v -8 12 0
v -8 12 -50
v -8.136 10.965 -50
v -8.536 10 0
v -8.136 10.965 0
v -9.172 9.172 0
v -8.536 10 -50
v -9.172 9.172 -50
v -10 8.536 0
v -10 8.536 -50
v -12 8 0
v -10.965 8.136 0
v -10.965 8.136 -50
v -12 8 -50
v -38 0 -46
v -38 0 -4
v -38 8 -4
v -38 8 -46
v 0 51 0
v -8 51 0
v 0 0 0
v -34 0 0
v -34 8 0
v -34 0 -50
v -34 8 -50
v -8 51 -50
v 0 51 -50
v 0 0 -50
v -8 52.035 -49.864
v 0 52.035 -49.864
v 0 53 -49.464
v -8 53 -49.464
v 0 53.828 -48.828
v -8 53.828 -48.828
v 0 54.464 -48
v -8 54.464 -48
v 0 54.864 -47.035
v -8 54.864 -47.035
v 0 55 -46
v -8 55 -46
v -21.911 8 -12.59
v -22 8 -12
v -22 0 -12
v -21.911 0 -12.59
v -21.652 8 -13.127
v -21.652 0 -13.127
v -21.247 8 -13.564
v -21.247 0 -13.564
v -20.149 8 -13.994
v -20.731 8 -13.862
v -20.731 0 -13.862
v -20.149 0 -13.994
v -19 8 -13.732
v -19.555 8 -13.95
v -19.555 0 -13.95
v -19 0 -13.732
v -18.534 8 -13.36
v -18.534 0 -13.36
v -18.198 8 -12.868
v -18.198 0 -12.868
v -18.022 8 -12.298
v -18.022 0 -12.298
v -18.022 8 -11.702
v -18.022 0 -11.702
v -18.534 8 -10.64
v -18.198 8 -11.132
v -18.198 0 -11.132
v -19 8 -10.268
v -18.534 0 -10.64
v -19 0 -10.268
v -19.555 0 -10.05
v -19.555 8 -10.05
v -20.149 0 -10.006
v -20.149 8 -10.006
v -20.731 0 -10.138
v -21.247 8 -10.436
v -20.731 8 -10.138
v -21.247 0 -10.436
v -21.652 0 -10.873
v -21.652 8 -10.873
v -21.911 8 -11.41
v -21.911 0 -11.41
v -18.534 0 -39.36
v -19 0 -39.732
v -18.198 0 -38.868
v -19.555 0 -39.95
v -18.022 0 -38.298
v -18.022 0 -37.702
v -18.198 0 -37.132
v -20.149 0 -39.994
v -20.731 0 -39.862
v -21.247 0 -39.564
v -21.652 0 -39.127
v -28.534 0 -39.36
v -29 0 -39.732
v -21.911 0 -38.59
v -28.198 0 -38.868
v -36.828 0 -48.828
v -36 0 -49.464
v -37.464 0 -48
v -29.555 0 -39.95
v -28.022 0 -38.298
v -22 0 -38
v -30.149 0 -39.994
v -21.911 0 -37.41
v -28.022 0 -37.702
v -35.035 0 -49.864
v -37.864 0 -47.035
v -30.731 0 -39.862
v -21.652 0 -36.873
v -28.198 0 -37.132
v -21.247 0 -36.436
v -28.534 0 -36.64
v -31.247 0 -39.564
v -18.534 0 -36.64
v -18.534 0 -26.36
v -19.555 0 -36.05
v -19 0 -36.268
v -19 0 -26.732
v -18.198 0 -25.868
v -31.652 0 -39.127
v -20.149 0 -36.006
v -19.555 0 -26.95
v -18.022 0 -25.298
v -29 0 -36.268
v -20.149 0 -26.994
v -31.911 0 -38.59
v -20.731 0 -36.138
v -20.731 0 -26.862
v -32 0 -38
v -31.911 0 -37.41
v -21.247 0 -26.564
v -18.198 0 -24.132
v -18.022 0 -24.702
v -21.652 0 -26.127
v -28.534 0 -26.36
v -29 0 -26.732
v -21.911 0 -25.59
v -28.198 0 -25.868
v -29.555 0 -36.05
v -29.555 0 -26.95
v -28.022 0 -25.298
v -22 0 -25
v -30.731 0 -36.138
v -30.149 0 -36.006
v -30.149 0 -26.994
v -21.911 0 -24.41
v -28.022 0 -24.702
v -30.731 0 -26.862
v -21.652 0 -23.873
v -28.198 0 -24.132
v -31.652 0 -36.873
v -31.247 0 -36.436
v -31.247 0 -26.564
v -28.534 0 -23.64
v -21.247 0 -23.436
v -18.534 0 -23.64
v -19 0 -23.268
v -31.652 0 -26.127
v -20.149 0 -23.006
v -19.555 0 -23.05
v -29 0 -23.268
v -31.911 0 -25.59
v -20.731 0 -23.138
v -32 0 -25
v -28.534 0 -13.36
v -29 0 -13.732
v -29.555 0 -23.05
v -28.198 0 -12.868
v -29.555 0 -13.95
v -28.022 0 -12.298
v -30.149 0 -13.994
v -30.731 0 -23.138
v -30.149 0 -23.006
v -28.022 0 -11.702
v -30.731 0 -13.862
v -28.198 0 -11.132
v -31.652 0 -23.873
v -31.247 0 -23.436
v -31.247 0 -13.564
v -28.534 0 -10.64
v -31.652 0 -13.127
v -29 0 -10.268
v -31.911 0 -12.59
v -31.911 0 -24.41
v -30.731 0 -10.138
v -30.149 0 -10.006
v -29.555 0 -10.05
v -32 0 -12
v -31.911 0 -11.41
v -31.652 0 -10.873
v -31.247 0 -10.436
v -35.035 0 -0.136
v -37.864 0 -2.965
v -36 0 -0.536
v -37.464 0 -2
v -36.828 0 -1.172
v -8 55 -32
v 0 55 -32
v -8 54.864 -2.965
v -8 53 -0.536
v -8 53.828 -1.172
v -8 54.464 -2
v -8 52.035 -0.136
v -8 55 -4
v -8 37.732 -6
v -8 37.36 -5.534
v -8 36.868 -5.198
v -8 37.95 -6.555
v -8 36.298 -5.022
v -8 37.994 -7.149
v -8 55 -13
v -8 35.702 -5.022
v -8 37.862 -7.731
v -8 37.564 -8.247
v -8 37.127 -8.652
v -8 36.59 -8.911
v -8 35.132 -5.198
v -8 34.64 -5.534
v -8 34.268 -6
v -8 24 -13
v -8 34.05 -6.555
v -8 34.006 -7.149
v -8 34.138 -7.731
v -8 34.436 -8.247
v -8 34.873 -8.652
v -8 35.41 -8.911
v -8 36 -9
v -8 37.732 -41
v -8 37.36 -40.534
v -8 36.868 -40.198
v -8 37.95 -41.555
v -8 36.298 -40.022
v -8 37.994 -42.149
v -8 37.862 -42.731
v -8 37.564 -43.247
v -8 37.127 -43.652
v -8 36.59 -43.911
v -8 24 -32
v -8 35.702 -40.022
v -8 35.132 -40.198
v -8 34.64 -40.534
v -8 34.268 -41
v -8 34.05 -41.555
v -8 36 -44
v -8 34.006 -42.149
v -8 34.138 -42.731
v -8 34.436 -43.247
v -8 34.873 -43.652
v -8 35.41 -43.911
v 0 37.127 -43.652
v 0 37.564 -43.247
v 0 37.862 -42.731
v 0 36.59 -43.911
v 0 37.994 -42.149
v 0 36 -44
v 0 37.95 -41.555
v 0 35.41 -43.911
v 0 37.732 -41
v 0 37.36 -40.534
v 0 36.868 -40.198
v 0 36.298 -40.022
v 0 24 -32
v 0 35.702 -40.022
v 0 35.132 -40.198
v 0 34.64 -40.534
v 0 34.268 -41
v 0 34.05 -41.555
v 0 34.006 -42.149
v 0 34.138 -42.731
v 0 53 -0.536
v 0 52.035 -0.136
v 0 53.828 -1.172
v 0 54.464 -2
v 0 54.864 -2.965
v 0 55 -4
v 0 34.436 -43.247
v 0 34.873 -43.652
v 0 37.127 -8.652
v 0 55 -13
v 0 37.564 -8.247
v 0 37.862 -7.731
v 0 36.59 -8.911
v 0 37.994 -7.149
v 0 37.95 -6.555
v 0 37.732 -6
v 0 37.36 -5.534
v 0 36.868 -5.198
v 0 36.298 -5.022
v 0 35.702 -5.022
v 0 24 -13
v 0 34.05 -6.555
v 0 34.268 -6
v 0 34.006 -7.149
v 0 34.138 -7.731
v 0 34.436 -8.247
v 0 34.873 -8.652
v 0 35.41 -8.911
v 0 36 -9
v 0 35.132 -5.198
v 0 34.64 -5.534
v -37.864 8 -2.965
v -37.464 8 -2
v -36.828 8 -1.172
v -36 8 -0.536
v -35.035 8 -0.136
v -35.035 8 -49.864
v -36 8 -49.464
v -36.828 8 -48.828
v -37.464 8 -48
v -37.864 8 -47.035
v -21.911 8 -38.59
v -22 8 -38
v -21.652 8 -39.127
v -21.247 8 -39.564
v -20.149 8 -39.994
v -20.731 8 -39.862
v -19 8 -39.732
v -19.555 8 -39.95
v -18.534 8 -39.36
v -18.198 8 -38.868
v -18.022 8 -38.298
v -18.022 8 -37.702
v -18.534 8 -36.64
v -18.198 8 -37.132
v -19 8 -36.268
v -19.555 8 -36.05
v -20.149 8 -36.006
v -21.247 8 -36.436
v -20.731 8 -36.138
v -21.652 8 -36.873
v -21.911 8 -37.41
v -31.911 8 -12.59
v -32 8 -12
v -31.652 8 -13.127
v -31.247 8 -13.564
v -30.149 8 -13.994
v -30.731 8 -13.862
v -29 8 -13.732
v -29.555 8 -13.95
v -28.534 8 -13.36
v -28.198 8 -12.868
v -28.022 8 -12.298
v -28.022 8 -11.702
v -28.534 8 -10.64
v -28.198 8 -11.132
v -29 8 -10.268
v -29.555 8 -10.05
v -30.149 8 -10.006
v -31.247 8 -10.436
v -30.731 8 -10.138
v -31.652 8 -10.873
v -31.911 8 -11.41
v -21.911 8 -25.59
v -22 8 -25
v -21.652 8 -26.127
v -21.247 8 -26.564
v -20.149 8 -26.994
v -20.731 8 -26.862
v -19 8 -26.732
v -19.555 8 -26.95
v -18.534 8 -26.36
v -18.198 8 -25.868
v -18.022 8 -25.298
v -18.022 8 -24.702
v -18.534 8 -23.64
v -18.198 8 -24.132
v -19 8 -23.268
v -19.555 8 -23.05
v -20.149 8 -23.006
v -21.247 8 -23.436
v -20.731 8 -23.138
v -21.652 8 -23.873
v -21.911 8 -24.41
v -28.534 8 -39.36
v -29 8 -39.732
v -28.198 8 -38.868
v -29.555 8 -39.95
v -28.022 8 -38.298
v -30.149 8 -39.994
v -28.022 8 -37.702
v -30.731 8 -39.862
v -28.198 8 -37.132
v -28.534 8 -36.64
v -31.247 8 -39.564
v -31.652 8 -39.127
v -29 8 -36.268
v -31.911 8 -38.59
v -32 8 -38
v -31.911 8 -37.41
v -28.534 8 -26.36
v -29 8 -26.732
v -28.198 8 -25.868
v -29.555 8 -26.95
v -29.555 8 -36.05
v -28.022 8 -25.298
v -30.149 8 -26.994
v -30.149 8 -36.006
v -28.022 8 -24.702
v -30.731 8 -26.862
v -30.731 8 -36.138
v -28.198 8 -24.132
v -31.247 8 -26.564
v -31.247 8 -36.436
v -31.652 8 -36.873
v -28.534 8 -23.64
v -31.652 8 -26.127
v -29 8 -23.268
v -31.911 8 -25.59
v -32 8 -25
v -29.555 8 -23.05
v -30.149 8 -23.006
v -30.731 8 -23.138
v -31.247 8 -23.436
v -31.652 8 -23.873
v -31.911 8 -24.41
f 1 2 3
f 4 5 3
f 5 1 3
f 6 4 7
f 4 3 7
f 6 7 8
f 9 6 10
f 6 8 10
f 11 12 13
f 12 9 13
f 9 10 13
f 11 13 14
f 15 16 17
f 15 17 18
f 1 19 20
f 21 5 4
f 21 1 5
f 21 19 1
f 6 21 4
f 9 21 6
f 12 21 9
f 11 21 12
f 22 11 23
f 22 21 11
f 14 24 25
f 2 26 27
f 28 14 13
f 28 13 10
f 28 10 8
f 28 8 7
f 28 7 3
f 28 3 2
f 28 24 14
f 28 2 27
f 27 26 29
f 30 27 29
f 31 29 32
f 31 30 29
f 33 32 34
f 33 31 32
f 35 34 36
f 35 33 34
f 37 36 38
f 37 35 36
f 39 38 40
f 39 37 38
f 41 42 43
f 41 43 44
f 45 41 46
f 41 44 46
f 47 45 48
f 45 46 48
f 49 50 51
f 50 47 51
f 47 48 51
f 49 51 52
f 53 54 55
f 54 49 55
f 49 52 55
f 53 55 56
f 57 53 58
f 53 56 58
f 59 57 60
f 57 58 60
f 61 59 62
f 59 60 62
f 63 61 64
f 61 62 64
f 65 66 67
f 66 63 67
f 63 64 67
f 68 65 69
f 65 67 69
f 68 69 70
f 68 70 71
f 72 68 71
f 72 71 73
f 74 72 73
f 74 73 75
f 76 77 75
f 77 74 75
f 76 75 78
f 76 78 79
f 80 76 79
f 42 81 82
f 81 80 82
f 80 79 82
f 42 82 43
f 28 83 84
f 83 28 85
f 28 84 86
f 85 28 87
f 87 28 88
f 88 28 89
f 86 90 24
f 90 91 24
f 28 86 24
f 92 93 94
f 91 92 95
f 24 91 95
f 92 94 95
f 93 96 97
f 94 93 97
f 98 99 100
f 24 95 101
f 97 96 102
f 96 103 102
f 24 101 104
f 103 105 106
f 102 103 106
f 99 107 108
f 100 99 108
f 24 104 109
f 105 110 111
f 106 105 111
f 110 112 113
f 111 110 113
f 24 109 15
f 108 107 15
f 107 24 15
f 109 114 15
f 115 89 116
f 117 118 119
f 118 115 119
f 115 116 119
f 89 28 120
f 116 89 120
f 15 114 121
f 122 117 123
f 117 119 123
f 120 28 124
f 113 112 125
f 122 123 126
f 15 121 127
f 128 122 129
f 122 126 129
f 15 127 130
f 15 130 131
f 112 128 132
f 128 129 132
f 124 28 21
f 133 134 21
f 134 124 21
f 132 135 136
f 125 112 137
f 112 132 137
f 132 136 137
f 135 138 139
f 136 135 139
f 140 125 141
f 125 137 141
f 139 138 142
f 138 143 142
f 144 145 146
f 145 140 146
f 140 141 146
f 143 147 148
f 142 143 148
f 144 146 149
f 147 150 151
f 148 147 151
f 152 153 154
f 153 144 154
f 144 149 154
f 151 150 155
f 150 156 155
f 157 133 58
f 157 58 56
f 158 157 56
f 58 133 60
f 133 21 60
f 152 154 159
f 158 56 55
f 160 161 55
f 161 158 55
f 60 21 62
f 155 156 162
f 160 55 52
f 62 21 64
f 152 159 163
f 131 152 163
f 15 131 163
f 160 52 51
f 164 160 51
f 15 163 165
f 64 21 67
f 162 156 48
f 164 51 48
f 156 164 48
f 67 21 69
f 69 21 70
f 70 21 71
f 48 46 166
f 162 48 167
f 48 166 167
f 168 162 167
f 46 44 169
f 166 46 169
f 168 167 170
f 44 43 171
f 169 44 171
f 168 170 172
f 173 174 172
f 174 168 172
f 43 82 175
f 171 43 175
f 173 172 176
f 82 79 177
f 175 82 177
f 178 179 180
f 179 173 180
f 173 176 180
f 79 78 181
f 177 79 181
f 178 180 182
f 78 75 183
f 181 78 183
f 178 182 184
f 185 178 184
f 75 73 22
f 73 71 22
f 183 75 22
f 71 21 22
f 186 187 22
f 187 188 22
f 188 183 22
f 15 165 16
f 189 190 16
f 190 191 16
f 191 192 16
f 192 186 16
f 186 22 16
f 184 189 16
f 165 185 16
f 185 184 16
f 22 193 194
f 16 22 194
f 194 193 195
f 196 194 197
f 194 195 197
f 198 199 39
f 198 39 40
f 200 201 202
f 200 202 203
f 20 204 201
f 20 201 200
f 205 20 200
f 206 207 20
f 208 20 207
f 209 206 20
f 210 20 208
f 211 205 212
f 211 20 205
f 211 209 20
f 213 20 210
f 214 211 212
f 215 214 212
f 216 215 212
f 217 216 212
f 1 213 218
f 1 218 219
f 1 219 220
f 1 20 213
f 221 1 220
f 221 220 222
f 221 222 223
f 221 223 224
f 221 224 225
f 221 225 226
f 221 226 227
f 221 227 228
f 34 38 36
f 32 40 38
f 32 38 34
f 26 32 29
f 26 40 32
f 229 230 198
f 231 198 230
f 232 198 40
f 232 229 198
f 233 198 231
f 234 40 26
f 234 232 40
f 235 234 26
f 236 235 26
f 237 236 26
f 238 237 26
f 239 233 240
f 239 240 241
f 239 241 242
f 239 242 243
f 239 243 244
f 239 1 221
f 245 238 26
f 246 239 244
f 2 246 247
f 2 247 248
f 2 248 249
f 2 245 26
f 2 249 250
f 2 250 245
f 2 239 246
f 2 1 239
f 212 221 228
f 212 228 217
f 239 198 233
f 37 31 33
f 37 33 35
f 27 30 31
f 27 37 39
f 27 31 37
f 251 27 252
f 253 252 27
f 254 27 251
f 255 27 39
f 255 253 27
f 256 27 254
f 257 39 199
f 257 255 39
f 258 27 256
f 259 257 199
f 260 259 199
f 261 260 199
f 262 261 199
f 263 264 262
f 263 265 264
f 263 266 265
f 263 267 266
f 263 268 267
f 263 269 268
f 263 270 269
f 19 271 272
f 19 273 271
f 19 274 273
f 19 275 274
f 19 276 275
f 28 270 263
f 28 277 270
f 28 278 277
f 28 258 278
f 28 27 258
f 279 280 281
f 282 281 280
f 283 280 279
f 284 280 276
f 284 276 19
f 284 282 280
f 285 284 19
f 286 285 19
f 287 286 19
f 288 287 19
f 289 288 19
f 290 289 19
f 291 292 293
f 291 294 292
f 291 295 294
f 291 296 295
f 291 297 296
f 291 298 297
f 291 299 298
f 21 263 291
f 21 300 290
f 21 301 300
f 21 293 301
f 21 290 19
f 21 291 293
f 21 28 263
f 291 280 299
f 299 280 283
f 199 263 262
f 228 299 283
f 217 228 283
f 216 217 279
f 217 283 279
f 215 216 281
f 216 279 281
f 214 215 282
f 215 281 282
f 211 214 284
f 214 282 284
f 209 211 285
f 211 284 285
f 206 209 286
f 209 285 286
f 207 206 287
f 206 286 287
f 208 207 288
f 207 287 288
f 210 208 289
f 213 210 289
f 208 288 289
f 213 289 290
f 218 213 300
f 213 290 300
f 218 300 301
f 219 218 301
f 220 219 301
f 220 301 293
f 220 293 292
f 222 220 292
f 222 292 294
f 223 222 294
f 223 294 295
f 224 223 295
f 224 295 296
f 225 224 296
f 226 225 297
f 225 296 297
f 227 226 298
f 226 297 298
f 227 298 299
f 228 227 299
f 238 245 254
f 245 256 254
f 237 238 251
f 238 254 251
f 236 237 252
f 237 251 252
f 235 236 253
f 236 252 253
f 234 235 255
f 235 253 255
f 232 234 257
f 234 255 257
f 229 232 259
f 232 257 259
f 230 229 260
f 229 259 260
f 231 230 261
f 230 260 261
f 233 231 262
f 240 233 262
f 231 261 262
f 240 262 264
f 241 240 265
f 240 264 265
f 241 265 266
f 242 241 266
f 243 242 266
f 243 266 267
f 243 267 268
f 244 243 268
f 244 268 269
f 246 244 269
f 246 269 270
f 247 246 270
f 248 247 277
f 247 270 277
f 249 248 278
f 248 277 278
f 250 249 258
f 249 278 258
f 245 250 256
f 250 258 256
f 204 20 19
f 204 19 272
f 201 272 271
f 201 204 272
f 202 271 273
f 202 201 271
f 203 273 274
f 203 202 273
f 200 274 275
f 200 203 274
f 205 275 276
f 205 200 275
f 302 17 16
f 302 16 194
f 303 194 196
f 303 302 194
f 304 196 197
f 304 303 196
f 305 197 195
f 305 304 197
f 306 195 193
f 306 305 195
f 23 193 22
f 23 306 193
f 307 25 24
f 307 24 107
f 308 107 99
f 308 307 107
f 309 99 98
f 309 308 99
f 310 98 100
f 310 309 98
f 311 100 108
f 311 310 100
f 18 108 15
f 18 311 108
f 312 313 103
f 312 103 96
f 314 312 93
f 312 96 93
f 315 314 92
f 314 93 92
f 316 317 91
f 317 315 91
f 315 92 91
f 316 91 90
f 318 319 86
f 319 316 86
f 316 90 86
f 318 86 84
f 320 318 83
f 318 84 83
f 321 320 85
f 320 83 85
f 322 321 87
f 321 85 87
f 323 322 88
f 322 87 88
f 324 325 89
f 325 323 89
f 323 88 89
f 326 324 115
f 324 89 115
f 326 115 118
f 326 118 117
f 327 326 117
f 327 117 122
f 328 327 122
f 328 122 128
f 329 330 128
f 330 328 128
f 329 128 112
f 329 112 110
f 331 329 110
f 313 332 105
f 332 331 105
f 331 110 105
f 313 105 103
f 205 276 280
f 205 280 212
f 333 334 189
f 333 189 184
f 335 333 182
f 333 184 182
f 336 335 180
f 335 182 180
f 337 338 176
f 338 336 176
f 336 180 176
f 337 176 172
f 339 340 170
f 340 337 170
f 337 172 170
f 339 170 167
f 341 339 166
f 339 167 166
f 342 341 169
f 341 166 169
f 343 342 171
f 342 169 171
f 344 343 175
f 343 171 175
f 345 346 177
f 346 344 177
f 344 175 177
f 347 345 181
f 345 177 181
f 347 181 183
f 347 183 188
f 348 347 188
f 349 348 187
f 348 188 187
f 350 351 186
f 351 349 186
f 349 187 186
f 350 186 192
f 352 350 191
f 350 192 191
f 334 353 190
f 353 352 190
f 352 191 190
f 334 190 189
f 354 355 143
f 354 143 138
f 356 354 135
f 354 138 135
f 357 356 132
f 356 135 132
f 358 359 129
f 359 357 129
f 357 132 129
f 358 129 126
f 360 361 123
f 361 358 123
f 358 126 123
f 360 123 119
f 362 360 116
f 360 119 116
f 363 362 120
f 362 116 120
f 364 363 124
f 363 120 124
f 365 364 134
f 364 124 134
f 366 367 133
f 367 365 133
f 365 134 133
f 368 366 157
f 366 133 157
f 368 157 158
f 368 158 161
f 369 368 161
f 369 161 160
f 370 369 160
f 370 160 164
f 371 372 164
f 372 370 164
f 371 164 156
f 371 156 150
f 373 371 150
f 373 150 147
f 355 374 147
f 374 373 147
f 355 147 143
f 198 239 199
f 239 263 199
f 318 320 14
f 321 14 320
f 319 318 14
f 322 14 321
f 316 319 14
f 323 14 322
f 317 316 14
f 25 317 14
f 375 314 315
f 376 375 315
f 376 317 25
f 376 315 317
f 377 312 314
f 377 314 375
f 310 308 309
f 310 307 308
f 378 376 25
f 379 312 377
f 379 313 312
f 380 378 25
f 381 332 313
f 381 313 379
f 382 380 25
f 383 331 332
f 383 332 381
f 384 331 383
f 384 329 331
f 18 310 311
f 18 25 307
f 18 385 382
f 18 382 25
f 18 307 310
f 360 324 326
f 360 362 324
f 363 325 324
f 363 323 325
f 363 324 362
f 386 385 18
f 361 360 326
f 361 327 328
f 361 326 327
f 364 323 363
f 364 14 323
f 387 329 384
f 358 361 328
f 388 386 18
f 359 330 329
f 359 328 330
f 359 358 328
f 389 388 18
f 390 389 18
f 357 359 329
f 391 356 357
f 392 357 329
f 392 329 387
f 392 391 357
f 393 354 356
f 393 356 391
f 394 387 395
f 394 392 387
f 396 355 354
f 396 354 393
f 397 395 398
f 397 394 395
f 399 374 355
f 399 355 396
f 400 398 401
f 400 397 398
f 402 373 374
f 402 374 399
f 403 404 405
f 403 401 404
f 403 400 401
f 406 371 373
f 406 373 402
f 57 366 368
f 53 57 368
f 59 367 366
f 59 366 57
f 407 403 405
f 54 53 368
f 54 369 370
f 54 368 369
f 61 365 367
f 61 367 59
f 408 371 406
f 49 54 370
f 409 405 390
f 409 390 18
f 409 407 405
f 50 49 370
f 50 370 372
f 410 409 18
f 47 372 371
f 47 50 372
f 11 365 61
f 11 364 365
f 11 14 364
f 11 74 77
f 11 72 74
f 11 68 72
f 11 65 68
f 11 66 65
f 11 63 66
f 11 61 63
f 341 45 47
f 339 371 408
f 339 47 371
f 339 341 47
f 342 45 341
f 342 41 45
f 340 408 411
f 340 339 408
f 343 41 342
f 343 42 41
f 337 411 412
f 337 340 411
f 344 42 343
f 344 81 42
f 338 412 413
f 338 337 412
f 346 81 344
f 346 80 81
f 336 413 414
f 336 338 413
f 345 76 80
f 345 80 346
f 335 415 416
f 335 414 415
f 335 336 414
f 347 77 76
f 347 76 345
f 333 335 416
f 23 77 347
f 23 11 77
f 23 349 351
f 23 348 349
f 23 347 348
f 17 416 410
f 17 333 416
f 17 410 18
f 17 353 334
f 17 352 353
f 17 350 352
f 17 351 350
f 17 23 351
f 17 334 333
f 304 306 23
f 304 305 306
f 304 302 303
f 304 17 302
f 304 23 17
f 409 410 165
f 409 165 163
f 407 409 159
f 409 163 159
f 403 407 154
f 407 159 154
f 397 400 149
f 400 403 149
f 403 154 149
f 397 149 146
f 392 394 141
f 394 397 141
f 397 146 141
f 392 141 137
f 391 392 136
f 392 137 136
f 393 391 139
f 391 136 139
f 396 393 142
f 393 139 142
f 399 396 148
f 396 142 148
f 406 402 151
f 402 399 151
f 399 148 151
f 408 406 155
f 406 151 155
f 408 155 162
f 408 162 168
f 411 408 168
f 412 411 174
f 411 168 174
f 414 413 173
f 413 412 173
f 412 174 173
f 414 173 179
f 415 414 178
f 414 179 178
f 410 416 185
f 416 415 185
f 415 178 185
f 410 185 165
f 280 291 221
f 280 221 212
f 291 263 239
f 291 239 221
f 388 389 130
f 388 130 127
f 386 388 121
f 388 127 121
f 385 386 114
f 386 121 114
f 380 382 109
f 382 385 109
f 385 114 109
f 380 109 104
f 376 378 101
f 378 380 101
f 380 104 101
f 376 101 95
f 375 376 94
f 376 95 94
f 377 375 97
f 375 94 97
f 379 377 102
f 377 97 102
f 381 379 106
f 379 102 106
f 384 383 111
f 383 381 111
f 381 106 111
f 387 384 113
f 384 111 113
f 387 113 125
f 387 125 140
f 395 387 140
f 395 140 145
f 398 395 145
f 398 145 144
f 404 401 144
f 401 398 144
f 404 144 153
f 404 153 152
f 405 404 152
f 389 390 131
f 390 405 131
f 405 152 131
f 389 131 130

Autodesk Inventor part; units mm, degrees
ref_plane "YZ Plane" through (0, 0, 0) normal (1, 0, 0) x (0, 1, 0)
ref_plane "XZ Plane" through (0, 0, 0) normal (0, 1, 0) x (-1, 0, 0)
ref_plane "XY Plane" through (0, 0, 0) normal (0, 0, 1) x (1, 0, 0)
sketch "Sketch1" plane through (0, 0, 0) normal (0, 1, 0) x (-1, 0, 0)
  line L0 (0, 0) -> (8, 0)
  line L1 (8, 0) -> (8, -50)
  line L2 (8, -50) -> (0, -50)
  line L3 (0, -50) -> (0, 0)
  line L4 (8, 0) -> (38, 0)
  line L5 (38, 0) -> (38, -50)
  line L6 (38, -50) -> (8, -50)
  line L7 (8, -50) -> (8, 0)
  circle A0 centre (30, -12) radius 2
  circle A1 centre (20, -12) radius 2
  circle A2 centre (30, -25) radius 2
  circle A3 centre (20, -25) radius 2
  circle A4 centre (30, -38) radius 2
  circle A5 centre (20, -38) radius 2
  dimension "d15" = 8
  dimension "d16" = 50
  dimension "d17" = 30
extrude "Extrusion3" add sketch "Sketch1" along normal blind 8 contours L4 L5 L6 L1
extrude "Extrusion4" add sketch "Sketch1" along normal blind 55 contours L0 L1 L2 L3
fillet "Fillet1" radius 4 1 edges at (-8, 8, -25)
sketch "Sketch2" plane through (0, 0, 0) normal (1, 0, 0) x (0, 0, -1)
  line L0 (50, 0) -> (0, 0) projected
  line L1 (10, 8) -> (10, 0) projected
  circle A0 centre (7, 36) radius 2
  circle A1 centre (42, 36) radius 2
  line L2 (0, 0) -> (0, 55) projected
  line L3 (50, 0) -> (50, 55) projected
  line L4 (50, 55) -> (0, 55) projected
  line L5 (32, 36) -> (32, 24)
  line L6 (32, 24) -> (13, 24)
  line L7 (13, 24) -> (13, 55)
  line L8 (32, 36) -> (32, 55)
  line L9 (13, 55) -> (32, 55)
  dimension "d30" = 7
  dimension "d31" = 50
  dimension "d32" = 35
  dimension "d33" = 8
  dimension "d34" = 18
  dimension "d35" = 19
extrude "Extrusion5" cut sketch "Sketch2" against normal blind 10 contours L8 L5 L6 L7 L4 | A0 | A1
fillet "Fillet2" radius 4 4 edges at (-4, 55, -50) (-4, 55, 0) (-38, 4, 0) (-38, 4, -50)
properties part number "_3DPrint"
